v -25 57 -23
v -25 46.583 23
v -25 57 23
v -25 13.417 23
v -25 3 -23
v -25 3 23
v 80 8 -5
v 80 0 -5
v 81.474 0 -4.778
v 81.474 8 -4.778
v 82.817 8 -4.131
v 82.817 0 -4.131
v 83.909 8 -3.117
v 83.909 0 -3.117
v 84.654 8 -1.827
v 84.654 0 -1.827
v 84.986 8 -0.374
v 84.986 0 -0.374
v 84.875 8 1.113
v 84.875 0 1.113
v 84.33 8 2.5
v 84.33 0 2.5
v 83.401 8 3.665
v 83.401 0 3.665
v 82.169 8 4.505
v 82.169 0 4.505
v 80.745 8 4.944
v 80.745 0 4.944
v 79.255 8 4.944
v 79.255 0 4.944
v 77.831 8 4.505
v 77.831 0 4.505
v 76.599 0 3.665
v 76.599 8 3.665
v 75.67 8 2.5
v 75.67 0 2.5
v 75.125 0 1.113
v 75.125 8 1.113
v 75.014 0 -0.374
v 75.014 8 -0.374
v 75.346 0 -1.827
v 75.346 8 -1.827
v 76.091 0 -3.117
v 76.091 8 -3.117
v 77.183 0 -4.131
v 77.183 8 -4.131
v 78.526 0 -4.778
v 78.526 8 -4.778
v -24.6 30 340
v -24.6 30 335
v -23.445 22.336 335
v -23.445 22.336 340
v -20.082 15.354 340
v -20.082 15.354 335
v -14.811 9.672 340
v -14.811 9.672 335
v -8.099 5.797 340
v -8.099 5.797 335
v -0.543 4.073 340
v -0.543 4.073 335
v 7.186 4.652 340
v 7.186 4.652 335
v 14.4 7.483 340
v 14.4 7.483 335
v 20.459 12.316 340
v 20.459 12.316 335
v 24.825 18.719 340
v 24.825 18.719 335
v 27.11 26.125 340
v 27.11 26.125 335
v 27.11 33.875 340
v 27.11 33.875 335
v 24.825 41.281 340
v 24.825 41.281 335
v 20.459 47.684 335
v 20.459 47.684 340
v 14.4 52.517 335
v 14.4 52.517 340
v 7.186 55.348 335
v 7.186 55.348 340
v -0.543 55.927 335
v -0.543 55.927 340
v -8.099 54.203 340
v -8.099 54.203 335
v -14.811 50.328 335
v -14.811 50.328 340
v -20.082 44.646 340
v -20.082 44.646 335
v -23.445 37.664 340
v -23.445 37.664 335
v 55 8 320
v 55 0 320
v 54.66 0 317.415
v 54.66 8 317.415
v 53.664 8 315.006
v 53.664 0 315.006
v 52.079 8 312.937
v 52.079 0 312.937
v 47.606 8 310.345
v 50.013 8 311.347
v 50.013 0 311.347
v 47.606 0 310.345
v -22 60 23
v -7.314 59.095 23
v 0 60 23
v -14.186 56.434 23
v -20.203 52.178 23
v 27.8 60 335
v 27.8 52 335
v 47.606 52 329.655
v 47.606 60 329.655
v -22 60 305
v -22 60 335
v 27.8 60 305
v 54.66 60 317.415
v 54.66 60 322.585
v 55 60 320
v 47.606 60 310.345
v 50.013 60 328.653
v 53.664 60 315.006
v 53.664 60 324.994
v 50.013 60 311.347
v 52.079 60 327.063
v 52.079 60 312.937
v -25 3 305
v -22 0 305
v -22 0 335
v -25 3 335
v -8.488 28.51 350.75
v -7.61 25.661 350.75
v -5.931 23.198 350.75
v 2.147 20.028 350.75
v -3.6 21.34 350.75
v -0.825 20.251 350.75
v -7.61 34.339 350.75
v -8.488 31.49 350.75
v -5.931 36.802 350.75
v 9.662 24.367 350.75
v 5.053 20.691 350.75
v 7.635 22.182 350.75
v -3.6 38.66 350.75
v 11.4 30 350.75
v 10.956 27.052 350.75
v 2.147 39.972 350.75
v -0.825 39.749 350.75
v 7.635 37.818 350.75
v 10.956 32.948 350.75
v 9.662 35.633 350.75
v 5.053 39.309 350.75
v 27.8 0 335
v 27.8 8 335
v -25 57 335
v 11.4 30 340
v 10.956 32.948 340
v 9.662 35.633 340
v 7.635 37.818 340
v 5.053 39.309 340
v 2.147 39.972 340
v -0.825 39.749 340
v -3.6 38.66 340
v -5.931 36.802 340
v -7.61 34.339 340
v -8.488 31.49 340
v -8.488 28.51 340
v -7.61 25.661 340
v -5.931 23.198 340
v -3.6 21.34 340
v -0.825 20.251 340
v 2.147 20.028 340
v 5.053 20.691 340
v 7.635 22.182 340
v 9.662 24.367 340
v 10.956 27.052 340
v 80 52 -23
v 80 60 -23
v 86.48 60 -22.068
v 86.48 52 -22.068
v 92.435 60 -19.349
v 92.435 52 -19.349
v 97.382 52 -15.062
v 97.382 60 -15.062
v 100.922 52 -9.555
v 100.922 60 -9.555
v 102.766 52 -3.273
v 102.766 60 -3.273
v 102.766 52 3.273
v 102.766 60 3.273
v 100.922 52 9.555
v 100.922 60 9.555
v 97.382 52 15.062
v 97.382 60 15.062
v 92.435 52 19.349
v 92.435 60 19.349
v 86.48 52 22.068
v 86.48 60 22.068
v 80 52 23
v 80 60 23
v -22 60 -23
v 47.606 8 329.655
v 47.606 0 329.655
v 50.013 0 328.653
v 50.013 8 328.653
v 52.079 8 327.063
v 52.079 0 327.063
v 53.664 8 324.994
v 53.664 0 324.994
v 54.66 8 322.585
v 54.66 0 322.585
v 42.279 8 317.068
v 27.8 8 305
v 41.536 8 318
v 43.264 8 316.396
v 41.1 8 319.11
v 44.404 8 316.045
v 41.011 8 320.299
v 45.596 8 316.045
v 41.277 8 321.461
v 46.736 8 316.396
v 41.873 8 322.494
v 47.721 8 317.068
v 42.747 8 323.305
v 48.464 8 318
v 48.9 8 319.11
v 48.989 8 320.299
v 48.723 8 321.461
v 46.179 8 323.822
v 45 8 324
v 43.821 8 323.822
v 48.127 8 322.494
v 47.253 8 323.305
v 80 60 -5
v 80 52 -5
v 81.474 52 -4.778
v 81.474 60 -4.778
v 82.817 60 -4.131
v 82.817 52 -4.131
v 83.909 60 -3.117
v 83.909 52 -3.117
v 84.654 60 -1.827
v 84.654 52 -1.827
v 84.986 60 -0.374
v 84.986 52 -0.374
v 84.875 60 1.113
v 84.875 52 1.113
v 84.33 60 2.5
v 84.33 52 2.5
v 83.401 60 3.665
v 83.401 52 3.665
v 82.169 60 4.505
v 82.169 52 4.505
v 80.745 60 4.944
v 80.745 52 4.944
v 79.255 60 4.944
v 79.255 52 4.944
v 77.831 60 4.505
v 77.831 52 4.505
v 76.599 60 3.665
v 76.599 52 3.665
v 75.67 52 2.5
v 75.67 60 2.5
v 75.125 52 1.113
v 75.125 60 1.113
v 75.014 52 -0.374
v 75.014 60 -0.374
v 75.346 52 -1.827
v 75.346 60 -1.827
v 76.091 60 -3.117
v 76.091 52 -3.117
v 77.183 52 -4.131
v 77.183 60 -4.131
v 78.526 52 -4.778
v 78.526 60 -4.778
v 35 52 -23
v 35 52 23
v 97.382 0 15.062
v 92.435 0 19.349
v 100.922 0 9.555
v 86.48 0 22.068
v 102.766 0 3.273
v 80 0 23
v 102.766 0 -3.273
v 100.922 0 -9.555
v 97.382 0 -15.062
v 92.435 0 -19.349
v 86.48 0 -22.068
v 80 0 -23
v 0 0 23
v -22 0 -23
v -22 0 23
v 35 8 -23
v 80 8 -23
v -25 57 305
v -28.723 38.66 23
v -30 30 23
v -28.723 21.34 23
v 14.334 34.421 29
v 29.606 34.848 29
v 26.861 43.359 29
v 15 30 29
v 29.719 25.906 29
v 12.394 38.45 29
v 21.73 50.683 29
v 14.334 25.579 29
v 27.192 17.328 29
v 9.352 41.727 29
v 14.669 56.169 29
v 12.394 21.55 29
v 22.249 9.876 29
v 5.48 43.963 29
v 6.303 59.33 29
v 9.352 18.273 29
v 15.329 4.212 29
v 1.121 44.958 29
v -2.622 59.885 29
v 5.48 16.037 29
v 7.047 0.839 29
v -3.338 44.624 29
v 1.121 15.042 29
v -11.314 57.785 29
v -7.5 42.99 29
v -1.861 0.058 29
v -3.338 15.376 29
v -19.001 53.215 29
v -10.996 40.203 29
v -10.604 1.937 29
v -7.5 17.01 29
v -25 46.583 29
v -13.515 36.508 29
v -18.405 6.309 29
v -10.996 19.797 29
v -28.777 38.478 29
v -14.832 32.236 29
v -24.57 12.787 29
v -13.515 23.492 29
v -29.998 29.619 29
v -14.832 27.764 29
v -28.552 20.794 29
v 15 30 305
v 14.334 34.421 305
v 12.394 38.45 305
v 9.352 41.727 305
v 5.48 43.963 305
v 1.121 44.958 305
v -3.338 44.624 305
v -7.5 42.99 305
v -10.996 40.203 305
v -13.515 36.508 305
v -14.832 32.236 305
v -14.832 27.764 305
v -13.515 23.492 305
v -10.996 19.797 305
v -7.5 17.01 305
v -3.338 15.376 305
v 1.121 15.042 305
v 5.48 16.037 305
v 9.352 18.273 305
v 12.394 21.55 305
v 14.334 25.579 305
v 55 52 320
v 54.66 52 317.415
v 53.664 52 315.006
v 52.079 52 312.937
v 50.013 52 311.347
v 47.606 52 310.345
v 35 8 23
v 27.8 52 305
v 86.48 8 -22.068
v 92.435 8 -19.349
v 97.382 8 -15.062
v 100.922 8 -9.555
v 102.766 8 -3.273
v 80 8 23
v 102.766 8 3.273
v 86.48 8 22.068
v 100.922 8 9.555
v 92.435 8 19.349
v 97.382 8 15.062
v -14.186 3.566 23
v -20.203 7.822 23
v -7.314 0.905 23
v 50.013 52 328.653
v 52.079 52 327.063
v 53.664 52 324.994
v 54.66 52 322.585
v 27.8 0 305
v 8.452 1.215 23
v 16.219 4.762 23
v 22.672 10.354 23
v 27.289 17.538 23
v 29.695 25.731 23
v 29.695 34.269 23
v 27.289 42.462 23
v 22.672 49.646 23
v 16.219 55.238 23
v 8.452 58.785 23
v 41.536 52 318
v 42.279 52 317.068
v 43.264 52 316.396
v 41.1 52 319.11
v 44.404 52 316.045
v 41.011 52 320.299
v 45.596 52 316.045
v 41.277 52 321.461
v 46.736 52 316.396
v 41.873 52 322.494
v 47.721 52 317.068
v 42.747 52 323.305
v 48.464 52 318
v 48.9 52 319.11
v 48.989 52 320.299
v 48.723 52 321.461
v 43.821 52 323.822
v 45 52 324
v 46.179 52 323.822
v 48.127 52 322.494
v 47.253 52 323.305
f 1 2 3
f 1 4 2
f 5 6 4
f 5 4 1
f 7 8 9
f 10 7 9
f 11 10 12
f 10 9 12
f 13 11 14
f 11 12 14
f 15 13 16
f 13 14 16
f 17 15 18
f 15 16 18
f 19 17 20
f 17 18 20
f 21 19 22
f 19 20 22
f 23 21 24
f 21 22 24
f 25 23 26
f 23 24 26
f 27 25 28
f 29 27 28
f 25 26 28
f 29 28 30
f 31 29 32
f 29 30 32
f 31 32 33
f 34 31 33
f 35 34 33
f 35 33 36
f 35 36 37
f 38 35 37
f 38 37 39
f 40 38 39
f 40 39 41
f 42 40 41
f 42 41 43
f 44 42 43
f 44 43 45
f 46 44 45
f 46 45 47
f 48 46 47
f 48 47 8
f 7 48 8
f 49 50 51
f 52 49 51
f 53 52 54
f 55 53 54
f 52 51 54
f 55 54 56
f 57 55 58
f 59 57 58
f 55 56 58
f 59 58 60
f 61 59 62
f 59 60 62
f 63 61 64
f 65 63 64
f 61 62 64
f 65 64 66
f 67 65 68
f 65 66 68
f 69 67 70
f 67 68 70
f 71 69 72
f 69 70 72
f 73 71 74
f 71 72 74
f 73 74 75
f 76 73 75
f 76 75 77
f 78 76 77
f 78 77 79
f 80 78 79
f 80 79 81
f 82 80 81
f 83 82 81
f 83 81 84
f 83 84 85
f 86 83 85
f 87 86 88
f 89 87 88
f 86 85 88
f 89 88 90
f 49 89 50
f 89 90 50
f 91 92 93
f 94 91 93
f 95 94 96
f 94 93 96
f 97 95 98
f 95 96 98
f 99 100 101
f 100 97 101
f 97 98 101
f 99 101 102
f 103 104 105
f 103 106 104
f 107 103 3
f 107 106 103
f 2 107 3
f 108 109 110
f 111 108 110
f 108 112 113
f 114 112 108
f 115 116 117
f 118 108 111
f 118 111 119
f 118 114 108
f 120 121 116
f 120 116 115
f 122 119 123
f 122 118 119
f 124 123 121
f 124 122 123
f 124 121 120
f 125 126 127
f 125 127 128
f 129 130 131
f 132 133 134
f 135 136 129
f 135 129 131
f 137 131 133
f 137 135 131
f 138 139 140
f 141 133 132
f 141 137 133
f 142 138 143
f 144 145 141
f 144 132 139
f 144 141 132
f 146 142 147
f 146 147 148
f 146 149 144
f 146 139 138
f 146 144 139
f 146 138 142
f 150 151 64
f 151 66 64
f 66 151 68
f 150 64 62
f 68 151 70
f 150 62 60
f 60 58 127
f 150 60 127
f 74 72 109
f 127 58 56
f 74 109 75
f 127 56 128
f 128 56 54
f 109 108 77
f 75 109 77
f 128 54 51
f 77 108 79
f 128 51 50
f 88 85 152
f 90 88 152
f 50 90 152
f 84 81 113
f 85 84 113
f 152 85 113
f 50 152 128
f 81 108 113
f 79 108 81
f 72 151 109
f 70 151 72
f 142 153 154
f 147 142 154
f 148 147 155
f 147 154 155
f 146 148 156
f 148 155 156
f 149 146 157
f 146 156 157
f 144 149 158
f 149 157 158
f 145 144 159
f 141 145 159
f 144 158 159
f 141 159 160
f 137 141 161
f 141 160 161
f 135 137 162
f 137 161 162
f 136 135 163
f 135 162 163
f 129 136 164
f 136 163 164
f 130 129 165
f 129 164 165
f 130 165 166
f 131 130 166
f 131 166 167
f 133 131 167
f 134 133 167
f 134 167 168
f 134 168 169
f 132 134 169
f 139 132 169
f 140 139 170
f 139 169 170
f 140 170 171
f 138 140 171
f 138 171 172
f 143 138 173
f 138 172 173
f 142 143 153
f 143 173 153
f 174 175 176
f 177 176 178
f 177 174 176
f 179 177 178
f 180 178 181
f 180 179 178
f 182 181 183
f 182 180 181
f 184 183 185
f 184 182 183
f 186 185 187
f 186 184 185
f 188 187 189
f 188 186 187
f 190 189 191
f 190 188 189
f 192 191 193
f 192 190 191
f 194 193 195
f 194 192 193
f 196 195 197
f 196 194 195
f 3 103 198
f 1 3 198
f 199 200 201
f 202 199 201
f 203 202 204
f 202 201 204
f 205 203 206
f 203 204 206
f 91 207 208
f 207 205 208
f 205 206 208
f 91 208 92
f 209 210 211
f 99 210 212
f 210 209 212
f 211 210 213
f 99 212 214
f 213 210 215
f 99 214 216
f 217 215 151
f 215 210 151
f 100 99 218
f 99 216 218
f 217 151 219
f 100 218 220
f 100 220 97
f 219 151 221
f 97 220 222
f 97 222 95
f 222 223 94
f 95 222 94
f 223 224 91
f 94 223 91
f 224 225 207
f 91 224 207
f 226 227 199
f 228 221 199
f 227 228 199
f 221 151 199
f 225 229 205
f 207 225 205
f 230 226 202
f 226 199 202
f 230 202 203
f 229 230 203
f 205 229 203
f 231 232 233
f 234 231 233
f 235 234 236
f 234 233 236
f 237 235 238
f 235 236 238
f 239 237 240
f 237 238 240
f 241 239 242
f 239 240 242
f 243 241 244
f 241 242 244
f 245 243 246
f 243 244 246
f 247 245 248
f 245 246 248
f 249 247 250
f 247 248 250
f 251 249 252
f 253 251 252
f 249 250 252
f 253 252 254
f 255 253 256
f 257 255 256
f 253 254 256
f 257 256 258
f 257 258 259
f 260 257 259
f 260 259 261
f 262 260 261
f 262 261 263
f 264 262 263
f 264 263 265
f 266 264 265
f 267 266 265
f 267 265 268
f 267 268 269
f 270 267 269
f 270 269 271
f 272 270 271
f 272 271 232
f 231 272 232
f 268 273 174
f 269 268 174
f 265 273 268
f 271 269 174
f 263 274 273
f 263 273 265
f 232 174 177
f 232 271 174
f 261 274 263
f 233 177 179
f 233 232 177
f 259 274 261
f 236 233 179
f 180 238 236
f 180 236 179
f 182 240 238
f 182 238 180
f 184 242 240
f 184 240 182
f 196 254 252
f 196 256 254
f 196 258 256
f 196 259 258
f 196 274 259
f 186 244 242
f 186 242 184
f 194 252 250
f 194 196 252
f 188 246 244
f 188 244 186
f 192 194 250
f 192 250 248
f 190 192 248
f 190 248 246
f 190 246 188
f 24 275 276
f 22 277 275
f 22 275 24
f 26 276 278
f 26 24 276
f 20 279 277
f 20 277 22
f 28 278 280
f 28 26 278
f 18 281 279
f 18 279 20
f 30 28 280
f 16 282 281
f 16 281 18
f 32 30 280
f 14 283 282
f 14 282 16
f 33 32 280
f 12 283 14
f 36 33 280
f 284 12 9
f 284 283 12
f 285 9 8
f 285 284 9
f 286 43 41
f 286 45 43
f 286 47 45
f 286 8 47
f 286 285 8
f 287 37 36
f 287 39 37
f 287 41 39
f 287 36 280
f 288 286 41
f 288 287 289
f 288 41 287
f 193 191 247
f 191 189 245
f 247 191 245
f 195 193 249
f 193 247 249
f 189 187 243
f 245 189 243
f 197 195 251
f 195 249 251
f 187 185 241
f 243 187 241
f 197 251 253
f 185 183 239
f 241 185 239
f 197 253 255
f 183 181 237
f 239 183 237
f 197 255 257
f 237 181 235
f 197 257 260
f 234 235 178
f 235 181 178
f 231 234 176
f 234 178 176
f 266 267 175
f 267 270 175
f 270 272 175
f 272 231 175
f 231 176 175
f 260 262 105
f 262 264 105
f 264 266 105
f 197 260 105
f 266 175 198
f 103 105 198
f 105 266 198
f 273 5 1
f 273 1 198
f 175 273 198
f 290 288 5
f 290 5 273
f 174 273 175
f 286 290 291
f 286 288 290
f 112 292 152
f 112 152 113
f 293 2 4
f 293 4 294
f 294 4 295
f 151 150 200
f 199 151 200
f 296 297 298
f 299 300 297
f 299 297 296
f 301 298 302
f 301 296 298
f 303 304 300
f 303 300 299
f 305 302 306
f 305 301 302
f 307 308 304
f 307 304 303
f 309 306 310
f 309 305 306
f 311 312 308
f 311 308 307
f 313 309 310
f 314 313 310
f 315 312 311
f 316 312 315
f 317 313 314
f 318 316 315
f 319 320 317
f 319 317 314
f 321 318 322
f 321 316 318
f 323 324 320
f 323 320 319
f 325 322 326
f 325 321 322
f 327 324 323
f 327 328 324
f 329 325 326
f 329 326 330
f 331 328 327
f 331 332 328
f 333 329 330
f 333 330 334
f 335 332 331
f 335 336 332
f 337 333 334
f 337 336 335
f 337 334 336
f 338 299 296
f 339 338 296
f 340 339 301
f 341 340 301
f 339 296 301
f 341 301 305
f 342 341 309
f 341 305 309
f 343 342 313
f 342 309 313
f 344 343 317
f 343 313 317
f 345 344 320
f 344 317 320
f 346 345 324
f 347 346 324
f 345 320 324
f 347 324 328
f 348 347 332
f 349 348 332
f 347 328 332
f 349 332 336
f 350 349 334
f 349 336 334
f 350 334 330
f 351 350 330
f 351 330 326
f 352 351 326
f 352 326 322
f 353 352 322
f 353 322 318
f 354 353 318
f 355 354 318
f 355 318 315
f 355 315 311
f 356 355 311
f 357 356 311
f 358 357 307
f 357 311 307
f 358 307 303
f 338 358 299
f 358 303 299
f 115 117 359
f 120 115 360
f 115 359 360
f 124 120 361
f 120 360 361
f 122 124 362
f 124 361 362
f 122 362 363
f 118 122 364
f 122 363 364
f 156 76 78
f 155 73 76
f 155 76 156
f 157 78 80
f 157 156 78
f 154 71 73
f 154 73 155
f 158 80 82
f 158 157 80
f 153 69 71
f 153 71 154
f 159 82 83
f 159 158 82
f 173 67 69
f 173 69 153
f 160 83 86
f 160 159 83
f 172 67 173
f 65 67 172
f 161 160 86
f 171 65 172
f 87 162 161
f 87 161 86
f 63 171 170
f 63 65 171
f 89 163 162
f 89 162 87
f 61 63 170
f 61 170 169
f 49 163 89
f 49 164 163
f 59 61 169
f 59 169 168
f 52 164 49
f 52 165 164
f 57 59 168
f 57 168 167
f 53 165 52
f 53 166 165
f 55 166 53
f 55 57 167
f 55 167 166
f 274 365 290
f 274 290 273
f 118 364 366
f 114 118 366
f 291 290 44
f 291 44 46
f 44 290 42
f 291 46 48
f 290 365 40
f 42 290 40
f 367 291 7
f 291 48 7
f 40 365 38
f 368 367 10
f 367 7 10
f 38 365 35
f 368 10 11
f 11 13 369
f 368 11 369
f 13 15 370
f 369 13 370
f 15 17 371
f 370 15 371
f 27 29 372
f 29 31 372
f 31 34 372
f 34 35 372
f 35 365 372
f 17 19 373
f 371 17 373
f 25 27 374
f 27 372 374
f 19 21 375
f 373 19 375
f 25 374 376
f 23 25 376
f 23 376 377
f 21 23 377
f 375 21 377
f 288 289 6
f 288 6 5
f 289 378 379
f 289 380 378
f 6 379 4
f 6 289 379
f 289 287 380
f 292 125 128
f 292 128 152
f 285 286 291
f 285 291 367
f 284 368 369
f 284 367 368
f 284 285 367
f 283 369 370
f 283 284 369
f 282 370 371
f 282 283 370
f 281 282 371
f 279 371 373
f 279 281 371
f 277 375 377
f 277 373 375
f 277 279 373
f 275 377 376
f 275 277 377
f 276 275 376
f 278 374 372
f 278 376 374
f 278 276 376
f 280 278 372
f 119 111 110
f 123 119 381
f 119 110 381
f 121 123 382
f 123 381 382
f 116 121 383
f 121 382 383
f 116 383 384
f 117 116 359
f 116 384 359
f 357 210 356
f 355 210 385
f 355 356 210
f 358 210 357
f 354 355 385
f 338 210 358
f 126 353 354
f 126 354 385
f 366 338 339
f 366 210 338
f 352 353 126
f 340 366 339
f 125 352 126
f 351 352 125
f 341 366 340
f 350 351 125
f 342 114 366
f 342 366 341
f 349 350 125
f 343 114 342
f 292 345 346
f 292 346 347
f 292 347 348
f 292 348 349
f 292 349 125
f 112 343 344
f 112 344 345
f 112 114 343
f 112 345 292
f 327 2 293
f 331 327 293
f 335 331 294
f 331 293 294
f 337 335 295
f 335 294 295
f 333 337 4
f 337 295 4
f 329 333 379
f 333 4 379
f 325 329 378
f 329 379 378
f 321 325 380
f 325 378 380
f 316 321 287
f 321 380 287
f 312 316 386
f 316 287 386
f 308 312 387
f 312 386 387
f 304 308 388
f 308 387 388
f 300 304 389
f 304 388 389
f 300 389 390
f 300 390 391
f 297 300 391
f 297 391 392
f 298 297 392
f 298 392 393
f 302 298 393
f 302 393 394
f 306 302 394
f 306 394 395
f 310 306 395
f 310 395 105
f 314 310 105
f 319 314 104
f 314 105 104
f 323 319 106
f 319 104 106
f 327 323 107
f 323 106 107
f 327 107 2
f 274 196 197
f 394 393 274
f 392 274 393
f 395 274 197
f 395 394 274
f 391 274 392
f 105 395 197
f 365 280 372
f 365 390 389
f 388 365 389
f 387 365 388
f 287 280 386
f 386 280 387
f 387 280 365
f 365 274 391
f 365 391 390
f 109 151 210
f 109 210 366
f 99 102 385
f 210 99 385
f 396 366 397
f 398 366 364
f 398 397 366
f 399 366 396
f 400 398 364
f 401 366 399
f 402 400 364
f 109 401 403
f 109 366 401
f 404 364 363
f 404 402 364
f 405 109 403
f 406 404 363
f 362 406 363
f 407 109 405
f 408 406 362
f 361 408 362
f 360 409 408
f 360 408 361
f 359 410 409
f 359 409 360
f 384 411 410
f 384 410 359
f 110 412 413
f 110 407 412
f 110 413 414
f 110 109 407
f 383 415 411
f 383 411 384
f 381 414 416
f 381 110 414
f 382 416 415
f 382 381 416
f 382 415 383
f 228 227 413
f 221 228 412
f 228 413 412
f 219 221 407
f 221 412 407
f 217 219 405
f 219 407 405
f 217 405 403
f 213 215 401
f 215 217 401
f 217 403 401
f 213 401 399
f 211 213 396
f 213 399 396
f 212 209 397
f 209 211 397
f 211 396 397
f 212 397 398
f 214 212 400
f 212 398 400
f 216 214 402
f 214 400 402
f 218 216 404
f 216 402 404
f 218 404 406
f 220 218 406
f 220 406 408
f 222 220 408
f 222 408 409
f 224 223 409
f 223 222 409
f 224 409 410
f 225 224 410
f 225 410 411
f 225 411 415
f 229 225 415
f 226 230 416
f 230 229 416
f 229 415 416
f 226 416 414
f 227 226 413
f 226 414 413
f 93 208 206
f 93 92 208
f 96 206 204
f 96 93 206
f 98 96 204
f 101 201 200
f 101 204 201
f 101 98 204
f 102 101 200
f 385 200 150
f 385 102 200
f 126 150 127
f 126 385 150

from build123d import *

# Parameters (mm, degrees)
SALIENTE_EXTRUIR1_DEPTH = 60
CROQUIS5_W              = 68
CROQUIS5_H              = 44
CORTAR_EXTRUIR1_DEPTH   = 128.769323392
CHAFL_N1_SIZE           = 3
CROQUIS6_R              = 30
SALIENTE_EXTRUIR4_DEPTH = 6
CROQUIS7_R              = 15
SALIENTE_EXTRUIR5_DEPTH = 276
SALIENTE_EXTRUIR6_DEPTH = 30
CORTAR_EXTRUIR2_REACH   = 379.323
CROQUIS9_W              = 27.2
CROQUIS9_H              = 44
CORTAR_EXTRUIR3_DEPTH   = 60
SALIENTE_EXTRUIR7_REACH = 356.313
CROQUIS11_R             = 4
CROQUIS13_R             = 26
SALIENTE_EXTRUIR8_DEPTH = 5
CROQUIS14_R             = 10
SALIENTE_EXTRUIR9_DEPTH = 10.75
CROQUIS15_R             = 5
CORTAR_EXTRUIR4_DEPTH   = 371.451835601


with BuildPart() as part:
    # Croquis2 → Saliente-Extruir1 (new body)
    with BuildSketch(Plane(origin=(0, 0, 0), x_dir=(1, 0, 0), z_dir=(0, 1, 0))):
        with BuildLine():
            Line((-25, -23), (-25, 23))
            Line((-25, 23), (80, 23))
            ThreePointArc((80, 23), (103, 0), (80, -23))
            Line((80, -23), (-25, -23))
        make_face()
    extrude(amount=SALIENTE_EXTRUIR1_DEPTH)

    # Croquis5 → Cortar-Extruir1 (cut, through all)
    with BuildSketch(Plane.XY.offset(23)):
        with Locations((69, 30)):
            Rectangle(CROQUIS5_W, CROQUIS5_H)
    extrude(amount=-CORTAR_EXTRUIR1_DEPTH, mode=Mode.SUBTRACT)

    # Chaflán1
    chafl_n1_edges = [part.edges().sort_by_distance(p)[0] for p in [
        (-25, 60, 0),
        (-25, 0, 0),
    ]]
    chamfer(chafl_n1_edges, length=CHAFL_N1_SIZE)

    # Croquis6 → Saliente-Extruir4 (add)
    with BuildSketch(Plane.XY.offset(23)):
        with Locations(Location((0, 30, 0), (0, 0, 146.442690238))):
            Circle(CROQUIS6_R)
    extrude(amount=SALIENTE_EXTRUIR4_DEPTH)

    # Croquis7 → Saliente-Extruir5 (add)
    with BuildSketch(Plane.XY.offset(29)):
        with Locations((0, 30)):
            Circle(CROQUIS7_R)
    extrude(amount=SALIENTE_EXTRUIR5_DEPTH)

    # Croquis8 → Saliente-Extruir6 (add)
    with BuildSketch(Plane.XY.offset(305)):
        Polygon((-22, 60), (55, 60), (55, 0), (-22, 0), (-25, 3), (-25, 57), align=None)
    extrude(amount=SALIENTE_EXTRUIR6_DEPTH)

    # Croquis9 → Cortar-Extruir2 (cut, up to next)
    with BuildSketch(Plane.XY.offset(335), mode=Mode.PRIVATE) as cortar_extruir2_sk1:
        with Locations((41.4, 30)):
            Rectangle(CROQUIS9_W, CROQUIS9_H)
    cortar_extruir2_tool1 = extrude(cortar_extruir2_sk1.sketch, amount=-CORTAR_EXTRUIR2_REACH, mode=Mode.PRIVATE) & part.part
    add(cortar_extruir2_tool1.solids().sort_by_distance((41.4, 30, 335))[0], mode=Mode.SUBTRACT)

    # Croquis10 → Cortar-Extruir3 (cut)
    with BuildSketch(Plane.XZ):
        with BuildLine():
            Line((55, 335), (27.8, 335))
            Line((27.8, 335), (47.605709584, 329.654546989))
            ThreePointArc((47.605709584, 329.654546989), (52.939052079, 326.080415453), (55, 320))
            Line((55, 320), (55, 335))
        make_face()
        with BuildLine():
            Line((55, 305), (55, 320))
            ThreePointArc((55, 320), (52.939052079, 313.919584547), (47.605709584, 310.345453011))
            Line((47.605709584, 310.345453011), (27.8, 305))
            Line((27.8, 305), (55, 305))
        make_face()
    extrude(amount=-CORTAR_EXTRUIR3_DEPTH, mode=Mode.SUBTRACT)

    # Croquis11 → Saliente-Extruir7 (add, up to next)
    with BuildSketch(Plane.XZ.offset(-52), mode=Mode.PRIVATE) as saliente_extruir7_sk1:
        with Locations(Location((45, 320, 0), (0, 0, 90))):
            Circle(CROQUIS11_R)
    saliente_extruir7_tool1 = extrude(saliente_extruir7_sk1.sketch, amount=SALIENTE_EXTRUIR7_REACH, mode=Mode.PRIVATE) - part.part
    add(saliente_extruir7_tool1.solids().sort_by_distance((45, 52, 320))[0])

    # Croquis13 → Saliente-Extruir8 (add)
    with BuildSketch(Plane.XY.offset(335)):
        with Locations(Location((1.4, 30, 0), (0, 0, 180))):
            Circle(CROQUIS13_R)
    extrude(amount=SALIENTE_EXTRUIR8_DEPTH)

    # Croquis14 → Saliente-Extruir9 (add)
    with BuildSketch(Plane.XY.offset(340)):
        with Locations((1.4, 30)):
            Circle(CROQUIS14_R)
    extrude(amount=SALIENTE_EXTRUIR9_DEPTH)

    # Croquis15 → Cortar-Extruir4 (cut, through all)
    with BuildSketch(Plane.XZ):
        with Locations(Location((80, 0, 0), (0, 0, 270))):
            Circle(CROQUIS15_R)
    extrude(amount=-CORTAR_EXTRUIR4_DEPTH, mode=Mode.SUBTRACT)


solid = part.part
